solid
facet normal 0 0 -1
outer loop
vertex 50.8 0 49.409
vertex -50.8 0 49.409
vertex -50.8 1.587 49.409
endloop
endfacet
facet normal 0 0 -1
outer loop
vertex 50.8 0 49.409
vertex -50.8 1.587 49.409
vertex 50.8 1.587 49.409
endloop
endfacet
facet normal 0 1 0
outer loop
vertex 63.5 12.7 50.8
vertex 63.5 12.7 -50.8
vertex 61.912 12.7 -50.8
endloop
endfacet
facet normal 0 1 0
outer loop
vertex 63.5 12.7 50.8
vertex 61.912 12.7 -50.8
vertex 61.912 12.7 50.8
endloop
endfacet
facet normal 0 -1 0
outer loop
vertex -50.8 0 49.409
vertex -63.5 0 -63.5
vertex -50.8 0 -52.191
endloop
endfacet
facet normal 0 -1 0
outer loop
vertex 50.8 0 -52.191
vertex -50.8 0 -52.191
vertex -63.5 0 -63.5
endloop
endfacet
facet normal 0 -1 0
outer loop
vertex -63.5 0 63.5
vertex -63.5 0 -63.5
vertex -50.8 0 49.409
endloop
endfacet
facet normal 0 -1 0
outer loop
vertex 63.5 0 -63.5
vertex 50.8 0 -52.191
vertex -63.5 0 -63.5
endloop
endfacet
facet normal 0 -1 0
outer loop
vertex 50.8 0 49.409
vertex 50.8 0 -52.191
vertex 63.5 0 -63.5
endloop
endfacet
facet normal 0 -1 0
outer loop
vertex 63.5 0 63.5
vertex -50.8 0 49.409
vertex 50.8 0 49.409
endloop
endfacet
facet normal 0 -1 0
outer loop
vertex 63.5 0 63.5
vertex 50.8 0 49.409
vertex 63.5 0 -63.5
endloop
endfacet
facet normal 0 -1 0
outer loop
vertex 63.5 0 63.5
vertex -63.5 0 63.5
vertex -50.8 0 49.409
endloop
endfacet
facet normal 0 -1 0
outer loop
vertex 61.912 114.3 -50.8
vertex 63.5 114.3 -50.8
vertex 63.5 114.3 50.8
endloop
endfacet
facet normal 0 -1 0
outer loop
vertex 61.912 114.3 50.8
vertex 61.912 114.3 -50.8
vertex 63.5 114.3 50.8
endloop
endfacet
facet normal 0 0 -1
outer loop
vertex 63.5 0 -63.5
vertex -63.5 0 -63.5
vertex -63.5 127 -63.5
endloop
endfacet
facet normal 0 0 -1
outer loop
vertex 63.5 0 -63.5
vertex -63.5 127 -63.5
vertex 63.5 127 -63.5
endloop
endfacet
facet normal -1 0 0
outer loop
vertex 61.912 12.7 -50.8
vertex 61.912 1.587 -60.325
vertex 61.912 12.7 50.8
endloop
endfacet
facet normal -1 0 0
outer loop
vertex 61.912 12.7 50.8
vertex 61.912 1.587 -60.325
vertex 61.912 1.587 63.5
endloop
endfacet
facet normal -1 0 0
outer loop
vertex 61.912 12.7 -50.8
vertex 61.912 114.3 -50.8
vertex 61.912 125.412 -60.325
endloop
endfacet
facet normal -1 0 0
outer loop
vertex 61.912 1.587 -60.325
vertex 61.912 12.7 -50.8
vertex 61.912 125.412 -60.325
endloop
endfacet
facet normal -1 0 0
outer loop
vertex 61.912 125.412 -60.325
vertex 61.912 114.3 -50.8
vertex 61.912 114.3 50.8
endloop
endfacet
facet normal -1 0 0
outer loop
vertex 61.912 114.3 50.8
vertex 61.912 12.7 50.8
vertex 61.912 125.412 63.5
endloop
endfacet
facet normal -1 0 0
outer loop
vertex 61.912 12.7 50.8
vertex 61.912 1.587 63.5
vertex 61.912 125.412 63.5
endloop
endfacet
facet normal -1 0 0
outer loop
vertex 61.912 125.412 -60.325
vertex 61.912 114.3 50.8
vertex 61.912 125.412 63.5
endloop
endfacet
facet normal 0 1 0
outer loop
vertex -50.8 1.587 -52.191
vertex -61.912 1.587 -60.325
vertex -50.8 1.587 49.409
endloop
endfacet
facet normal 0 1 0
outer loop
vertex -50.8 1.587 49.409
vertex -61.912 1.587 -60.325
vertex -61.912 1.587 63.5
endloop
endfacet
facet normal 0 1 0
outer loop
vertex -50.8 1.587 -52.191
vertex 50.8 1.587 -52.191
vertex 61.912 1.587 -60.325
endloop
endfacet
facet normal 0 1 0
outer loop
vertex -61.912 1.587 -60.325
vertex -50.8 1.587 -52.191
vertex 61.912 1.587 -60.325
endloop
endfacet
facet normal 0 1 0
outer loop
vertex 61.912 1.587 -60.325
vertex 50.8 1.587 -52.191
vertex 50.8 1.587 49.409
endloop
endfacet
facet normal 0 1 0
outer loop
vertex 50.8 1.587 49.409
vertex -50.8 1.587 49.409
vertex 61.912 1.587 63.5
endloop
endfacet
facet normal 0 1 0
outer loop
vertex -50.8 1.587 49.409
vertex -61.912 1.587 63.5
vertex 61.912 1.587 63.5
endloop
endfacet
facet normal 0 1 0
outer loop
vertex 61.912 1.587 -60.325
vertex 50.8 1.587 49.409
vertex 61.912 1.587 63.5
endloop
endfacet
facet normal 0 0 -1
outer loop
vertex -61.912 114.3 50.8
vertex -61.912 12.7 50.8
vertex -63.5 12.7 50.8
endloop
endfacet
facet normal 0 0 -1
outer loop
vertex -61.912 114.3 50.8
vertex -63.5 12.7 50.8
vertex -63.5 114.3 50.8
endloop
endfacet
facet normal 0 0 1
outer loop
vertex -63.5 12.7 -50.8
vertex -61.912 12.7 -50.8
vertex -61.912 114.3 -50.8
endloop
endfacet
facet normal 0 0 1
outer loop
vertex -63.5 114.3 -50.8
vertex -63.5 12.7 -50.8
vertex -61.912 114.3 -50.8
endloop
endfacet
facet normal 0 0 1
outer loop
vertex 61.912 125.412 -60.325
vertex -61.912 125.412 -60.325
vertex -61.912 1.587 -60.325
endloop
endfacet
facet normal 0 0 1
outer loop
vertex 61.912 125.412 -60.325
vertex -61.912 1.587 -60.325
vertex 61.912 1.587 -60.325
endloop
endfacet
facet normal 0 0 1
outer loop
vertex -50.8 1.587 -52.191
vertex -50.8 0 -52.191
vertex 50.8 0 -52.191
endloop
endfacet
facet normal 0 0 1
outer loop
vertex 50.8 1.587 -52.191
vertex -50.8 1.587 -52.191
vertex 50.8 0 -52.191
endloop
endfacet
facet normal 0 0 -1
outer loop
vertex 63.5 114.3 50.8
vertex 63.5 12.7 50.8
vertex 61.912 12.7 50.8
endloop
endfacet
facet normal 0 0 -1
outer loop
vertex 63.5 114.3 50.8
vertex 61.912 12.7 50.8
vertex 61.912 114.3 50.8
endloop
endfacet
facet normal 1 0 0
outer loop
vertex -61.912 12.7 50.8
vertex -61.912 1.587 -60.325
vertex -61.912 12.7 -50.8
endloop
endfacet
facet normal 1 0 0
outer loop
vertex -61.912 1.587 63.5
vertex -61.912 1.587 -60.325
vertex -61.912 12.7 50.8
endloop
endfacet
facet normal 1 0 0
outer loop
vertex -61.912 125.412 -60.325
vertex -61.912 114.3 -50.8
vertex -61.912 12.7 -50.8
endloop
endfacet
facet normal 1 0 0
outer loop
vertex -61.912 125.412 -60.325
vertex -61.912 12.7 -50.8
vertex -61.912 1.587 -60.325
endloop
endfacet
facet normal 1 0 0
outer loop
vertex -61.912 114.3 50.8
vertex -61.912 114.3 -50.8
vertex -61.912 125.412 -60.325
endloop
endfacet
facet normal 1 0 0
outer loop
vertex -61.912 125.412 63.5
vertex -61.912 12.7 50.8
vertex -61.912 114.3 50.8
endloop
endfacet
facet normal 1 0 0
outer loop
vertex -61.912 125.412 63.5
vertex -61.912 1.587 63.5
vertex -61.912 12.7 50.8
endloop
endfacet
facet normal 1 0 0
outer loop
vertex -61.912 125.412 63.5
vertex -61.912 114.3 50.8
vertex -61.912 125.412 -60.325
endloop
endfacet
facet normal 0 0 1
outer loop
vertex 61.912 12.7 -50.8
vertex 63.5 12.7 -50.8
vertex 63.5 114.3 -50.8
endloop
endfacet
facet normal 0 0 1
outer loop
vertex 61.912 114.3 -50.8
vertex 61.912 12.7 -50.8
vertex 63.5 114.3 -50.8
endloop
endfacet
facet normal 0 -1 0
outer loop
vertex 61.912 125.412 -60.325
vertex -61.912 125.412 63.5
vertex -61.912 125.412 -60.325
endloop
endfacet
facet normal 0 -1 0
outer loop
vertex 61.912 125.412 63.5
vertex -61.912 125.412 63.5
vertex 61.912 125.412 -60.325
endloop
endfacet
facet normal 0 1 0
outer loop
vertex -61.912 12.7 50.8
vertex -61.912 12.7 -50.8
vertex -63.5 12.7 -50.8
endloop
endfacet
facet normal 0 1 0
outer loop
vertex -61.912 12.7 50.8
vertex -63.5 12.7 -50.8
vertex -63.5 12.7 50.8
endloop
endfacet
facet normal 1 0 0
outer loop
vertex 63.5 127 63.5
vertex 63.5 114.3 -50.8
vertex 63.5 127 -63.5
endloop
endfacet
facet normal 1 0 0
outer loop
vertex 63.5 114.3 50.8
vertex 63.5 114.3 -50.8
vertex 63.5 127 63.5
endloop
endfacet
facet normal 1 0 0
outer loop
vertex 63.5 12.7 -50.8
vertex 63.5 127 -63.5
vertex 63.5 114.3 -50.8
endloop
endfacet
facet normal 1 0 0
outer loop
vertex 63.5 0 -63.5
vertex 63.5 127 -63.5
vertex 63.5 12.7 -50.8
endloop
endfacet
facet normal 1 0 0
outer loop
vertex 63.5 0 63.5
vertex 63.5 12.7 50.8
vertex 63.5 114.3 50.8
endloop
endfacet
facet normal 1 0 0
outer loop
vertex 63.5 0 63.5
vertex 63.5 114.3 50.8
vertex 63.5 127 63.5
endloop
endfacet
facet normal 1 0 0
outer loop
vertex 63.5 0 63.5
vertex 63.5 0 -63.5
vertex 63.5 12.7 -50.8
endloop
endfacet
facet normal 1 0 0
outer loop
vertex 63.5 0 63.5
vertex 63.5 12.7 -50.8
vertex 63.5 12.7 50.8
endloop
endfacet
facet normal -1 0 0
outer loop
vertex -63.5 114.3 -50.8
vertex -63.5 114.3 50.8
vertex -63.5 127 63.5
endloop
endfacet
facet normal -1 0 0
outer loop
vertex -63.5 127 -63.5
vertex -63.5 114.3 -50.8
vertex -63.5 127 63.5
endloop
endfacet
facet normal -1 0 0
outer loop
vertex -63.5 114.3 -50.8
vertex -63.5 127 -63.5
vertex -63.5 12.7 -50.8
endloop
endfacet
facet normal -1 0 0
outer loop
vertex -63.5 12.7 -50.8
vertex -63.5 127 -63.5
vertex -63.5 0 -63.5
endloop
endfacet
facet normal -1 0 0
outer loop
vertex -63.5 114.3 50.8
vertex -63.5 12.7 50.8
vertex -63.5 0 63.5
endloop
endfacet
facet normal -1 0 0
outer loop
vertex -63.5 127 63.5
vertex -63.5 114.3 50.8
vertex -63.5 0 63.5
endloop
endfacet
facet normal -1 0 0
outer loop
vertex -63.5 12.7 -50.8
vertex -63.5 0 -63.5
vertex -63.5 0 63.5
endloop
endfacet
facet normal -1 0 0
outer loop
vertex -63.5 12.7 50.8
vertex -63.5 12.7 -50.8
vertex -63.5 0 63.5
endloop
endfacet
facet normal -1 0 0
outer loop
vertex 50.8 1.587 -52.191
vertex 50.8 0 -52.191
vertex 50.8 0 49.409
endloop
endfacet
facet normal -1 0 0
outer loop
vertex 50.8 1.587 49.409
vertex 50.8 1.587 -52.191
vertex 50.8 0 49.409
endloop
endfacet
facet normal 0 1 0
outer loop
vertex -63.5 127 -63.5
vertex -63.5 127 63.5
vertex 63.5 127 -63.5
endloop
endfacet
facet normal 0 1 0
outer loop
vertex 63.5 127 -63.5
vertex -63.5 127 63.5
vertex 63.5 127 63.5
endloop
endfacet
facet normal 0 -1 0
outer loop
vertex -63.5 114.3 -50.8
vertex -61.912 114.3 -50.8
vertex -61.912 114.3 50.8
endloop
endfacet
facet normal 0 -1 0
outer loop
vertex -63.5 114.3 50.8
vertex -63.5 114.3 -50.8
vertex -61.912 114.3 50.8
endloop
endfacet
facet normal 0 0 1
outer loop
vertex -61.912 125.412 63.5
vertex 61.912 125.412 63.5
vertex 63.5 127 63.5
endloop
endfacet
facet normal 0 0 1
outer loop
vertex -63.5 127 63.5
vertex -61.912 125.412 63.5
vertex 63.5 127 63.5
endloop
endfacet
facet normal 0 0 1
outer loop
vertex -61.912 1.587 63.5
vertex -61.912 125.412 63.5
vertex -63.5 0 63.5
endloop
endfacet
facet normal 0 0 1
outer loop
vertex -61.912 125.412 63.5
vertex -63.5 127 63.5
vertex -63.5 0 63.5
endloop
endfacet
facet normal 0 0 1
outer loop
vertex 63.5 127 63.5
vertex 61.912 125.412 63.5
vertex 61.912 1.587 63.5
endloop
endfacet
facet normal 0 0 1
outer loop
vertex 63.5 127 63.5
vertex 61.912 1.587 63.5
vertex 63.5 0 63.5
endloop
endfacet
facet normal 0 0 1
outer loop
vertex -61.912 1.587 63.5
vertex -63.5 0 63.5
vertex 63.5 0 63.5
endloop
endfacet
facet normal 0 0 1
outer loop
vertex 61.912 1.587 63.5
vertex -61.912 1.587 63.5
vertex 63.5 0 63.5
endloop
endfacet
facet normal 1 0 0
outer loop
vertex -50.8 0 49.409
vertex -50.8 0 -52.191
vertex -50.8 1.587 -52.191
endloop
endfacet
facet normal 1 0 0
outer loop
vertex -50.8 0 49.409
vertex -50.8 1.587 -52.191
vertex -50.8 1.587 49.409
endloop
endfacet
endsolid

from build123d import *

# Parameters (mm, degrees)
F0_W     = 127
F0_H     = 127
F1_DEPTH = 127
F2_W     = 101.6
F2_H     = 101.6
F3_DEPTH = 123.825
F4_W     = 101.6
F4_H     = 101.6
F5_DEPTH = 127.001
F6_W     = 123.825
F6_H     = 123.825
F7_DEPTH = 123.825


with BuildPart() as f1:
    # F0 (on Front) → F1 (new body)
    with BuildSketch(Plane.XZ):
        Rectangle(F0_W, F0_H)
    extrude(amount=-F1_DEPTH)

    # F2 (on face) → F3 (cut)
    with BuildSketch(Plane.XZ):
        with Locations((0, -1.39066)):
            Rectangle(F2_W, F2_H)
    extrude(amount=-F3_DEPTH, mode=Mode.SUBTRACT)

    # F4 (on face) → F5 (cut, through all)
    with BuildSketch(Plane.YZ.offset(63.5)):
        with Locations((63.5, 0)):
            Rectangle(F4_W, F4_H)
    extrude(amount=-F5_DEPTH, mode=Mode.SUBTRACT)

    # F6 (on face) → F7 (cut)
    with BuildSketch(Plane.XY.offset(63.5)):
        with Locations((0, 63.5)):
            Rectangle(F6_W, F6_H)
    extrude(amount=-F7_DEPTH, mode=Mode.SUBTRACT)


solid = f1.part
